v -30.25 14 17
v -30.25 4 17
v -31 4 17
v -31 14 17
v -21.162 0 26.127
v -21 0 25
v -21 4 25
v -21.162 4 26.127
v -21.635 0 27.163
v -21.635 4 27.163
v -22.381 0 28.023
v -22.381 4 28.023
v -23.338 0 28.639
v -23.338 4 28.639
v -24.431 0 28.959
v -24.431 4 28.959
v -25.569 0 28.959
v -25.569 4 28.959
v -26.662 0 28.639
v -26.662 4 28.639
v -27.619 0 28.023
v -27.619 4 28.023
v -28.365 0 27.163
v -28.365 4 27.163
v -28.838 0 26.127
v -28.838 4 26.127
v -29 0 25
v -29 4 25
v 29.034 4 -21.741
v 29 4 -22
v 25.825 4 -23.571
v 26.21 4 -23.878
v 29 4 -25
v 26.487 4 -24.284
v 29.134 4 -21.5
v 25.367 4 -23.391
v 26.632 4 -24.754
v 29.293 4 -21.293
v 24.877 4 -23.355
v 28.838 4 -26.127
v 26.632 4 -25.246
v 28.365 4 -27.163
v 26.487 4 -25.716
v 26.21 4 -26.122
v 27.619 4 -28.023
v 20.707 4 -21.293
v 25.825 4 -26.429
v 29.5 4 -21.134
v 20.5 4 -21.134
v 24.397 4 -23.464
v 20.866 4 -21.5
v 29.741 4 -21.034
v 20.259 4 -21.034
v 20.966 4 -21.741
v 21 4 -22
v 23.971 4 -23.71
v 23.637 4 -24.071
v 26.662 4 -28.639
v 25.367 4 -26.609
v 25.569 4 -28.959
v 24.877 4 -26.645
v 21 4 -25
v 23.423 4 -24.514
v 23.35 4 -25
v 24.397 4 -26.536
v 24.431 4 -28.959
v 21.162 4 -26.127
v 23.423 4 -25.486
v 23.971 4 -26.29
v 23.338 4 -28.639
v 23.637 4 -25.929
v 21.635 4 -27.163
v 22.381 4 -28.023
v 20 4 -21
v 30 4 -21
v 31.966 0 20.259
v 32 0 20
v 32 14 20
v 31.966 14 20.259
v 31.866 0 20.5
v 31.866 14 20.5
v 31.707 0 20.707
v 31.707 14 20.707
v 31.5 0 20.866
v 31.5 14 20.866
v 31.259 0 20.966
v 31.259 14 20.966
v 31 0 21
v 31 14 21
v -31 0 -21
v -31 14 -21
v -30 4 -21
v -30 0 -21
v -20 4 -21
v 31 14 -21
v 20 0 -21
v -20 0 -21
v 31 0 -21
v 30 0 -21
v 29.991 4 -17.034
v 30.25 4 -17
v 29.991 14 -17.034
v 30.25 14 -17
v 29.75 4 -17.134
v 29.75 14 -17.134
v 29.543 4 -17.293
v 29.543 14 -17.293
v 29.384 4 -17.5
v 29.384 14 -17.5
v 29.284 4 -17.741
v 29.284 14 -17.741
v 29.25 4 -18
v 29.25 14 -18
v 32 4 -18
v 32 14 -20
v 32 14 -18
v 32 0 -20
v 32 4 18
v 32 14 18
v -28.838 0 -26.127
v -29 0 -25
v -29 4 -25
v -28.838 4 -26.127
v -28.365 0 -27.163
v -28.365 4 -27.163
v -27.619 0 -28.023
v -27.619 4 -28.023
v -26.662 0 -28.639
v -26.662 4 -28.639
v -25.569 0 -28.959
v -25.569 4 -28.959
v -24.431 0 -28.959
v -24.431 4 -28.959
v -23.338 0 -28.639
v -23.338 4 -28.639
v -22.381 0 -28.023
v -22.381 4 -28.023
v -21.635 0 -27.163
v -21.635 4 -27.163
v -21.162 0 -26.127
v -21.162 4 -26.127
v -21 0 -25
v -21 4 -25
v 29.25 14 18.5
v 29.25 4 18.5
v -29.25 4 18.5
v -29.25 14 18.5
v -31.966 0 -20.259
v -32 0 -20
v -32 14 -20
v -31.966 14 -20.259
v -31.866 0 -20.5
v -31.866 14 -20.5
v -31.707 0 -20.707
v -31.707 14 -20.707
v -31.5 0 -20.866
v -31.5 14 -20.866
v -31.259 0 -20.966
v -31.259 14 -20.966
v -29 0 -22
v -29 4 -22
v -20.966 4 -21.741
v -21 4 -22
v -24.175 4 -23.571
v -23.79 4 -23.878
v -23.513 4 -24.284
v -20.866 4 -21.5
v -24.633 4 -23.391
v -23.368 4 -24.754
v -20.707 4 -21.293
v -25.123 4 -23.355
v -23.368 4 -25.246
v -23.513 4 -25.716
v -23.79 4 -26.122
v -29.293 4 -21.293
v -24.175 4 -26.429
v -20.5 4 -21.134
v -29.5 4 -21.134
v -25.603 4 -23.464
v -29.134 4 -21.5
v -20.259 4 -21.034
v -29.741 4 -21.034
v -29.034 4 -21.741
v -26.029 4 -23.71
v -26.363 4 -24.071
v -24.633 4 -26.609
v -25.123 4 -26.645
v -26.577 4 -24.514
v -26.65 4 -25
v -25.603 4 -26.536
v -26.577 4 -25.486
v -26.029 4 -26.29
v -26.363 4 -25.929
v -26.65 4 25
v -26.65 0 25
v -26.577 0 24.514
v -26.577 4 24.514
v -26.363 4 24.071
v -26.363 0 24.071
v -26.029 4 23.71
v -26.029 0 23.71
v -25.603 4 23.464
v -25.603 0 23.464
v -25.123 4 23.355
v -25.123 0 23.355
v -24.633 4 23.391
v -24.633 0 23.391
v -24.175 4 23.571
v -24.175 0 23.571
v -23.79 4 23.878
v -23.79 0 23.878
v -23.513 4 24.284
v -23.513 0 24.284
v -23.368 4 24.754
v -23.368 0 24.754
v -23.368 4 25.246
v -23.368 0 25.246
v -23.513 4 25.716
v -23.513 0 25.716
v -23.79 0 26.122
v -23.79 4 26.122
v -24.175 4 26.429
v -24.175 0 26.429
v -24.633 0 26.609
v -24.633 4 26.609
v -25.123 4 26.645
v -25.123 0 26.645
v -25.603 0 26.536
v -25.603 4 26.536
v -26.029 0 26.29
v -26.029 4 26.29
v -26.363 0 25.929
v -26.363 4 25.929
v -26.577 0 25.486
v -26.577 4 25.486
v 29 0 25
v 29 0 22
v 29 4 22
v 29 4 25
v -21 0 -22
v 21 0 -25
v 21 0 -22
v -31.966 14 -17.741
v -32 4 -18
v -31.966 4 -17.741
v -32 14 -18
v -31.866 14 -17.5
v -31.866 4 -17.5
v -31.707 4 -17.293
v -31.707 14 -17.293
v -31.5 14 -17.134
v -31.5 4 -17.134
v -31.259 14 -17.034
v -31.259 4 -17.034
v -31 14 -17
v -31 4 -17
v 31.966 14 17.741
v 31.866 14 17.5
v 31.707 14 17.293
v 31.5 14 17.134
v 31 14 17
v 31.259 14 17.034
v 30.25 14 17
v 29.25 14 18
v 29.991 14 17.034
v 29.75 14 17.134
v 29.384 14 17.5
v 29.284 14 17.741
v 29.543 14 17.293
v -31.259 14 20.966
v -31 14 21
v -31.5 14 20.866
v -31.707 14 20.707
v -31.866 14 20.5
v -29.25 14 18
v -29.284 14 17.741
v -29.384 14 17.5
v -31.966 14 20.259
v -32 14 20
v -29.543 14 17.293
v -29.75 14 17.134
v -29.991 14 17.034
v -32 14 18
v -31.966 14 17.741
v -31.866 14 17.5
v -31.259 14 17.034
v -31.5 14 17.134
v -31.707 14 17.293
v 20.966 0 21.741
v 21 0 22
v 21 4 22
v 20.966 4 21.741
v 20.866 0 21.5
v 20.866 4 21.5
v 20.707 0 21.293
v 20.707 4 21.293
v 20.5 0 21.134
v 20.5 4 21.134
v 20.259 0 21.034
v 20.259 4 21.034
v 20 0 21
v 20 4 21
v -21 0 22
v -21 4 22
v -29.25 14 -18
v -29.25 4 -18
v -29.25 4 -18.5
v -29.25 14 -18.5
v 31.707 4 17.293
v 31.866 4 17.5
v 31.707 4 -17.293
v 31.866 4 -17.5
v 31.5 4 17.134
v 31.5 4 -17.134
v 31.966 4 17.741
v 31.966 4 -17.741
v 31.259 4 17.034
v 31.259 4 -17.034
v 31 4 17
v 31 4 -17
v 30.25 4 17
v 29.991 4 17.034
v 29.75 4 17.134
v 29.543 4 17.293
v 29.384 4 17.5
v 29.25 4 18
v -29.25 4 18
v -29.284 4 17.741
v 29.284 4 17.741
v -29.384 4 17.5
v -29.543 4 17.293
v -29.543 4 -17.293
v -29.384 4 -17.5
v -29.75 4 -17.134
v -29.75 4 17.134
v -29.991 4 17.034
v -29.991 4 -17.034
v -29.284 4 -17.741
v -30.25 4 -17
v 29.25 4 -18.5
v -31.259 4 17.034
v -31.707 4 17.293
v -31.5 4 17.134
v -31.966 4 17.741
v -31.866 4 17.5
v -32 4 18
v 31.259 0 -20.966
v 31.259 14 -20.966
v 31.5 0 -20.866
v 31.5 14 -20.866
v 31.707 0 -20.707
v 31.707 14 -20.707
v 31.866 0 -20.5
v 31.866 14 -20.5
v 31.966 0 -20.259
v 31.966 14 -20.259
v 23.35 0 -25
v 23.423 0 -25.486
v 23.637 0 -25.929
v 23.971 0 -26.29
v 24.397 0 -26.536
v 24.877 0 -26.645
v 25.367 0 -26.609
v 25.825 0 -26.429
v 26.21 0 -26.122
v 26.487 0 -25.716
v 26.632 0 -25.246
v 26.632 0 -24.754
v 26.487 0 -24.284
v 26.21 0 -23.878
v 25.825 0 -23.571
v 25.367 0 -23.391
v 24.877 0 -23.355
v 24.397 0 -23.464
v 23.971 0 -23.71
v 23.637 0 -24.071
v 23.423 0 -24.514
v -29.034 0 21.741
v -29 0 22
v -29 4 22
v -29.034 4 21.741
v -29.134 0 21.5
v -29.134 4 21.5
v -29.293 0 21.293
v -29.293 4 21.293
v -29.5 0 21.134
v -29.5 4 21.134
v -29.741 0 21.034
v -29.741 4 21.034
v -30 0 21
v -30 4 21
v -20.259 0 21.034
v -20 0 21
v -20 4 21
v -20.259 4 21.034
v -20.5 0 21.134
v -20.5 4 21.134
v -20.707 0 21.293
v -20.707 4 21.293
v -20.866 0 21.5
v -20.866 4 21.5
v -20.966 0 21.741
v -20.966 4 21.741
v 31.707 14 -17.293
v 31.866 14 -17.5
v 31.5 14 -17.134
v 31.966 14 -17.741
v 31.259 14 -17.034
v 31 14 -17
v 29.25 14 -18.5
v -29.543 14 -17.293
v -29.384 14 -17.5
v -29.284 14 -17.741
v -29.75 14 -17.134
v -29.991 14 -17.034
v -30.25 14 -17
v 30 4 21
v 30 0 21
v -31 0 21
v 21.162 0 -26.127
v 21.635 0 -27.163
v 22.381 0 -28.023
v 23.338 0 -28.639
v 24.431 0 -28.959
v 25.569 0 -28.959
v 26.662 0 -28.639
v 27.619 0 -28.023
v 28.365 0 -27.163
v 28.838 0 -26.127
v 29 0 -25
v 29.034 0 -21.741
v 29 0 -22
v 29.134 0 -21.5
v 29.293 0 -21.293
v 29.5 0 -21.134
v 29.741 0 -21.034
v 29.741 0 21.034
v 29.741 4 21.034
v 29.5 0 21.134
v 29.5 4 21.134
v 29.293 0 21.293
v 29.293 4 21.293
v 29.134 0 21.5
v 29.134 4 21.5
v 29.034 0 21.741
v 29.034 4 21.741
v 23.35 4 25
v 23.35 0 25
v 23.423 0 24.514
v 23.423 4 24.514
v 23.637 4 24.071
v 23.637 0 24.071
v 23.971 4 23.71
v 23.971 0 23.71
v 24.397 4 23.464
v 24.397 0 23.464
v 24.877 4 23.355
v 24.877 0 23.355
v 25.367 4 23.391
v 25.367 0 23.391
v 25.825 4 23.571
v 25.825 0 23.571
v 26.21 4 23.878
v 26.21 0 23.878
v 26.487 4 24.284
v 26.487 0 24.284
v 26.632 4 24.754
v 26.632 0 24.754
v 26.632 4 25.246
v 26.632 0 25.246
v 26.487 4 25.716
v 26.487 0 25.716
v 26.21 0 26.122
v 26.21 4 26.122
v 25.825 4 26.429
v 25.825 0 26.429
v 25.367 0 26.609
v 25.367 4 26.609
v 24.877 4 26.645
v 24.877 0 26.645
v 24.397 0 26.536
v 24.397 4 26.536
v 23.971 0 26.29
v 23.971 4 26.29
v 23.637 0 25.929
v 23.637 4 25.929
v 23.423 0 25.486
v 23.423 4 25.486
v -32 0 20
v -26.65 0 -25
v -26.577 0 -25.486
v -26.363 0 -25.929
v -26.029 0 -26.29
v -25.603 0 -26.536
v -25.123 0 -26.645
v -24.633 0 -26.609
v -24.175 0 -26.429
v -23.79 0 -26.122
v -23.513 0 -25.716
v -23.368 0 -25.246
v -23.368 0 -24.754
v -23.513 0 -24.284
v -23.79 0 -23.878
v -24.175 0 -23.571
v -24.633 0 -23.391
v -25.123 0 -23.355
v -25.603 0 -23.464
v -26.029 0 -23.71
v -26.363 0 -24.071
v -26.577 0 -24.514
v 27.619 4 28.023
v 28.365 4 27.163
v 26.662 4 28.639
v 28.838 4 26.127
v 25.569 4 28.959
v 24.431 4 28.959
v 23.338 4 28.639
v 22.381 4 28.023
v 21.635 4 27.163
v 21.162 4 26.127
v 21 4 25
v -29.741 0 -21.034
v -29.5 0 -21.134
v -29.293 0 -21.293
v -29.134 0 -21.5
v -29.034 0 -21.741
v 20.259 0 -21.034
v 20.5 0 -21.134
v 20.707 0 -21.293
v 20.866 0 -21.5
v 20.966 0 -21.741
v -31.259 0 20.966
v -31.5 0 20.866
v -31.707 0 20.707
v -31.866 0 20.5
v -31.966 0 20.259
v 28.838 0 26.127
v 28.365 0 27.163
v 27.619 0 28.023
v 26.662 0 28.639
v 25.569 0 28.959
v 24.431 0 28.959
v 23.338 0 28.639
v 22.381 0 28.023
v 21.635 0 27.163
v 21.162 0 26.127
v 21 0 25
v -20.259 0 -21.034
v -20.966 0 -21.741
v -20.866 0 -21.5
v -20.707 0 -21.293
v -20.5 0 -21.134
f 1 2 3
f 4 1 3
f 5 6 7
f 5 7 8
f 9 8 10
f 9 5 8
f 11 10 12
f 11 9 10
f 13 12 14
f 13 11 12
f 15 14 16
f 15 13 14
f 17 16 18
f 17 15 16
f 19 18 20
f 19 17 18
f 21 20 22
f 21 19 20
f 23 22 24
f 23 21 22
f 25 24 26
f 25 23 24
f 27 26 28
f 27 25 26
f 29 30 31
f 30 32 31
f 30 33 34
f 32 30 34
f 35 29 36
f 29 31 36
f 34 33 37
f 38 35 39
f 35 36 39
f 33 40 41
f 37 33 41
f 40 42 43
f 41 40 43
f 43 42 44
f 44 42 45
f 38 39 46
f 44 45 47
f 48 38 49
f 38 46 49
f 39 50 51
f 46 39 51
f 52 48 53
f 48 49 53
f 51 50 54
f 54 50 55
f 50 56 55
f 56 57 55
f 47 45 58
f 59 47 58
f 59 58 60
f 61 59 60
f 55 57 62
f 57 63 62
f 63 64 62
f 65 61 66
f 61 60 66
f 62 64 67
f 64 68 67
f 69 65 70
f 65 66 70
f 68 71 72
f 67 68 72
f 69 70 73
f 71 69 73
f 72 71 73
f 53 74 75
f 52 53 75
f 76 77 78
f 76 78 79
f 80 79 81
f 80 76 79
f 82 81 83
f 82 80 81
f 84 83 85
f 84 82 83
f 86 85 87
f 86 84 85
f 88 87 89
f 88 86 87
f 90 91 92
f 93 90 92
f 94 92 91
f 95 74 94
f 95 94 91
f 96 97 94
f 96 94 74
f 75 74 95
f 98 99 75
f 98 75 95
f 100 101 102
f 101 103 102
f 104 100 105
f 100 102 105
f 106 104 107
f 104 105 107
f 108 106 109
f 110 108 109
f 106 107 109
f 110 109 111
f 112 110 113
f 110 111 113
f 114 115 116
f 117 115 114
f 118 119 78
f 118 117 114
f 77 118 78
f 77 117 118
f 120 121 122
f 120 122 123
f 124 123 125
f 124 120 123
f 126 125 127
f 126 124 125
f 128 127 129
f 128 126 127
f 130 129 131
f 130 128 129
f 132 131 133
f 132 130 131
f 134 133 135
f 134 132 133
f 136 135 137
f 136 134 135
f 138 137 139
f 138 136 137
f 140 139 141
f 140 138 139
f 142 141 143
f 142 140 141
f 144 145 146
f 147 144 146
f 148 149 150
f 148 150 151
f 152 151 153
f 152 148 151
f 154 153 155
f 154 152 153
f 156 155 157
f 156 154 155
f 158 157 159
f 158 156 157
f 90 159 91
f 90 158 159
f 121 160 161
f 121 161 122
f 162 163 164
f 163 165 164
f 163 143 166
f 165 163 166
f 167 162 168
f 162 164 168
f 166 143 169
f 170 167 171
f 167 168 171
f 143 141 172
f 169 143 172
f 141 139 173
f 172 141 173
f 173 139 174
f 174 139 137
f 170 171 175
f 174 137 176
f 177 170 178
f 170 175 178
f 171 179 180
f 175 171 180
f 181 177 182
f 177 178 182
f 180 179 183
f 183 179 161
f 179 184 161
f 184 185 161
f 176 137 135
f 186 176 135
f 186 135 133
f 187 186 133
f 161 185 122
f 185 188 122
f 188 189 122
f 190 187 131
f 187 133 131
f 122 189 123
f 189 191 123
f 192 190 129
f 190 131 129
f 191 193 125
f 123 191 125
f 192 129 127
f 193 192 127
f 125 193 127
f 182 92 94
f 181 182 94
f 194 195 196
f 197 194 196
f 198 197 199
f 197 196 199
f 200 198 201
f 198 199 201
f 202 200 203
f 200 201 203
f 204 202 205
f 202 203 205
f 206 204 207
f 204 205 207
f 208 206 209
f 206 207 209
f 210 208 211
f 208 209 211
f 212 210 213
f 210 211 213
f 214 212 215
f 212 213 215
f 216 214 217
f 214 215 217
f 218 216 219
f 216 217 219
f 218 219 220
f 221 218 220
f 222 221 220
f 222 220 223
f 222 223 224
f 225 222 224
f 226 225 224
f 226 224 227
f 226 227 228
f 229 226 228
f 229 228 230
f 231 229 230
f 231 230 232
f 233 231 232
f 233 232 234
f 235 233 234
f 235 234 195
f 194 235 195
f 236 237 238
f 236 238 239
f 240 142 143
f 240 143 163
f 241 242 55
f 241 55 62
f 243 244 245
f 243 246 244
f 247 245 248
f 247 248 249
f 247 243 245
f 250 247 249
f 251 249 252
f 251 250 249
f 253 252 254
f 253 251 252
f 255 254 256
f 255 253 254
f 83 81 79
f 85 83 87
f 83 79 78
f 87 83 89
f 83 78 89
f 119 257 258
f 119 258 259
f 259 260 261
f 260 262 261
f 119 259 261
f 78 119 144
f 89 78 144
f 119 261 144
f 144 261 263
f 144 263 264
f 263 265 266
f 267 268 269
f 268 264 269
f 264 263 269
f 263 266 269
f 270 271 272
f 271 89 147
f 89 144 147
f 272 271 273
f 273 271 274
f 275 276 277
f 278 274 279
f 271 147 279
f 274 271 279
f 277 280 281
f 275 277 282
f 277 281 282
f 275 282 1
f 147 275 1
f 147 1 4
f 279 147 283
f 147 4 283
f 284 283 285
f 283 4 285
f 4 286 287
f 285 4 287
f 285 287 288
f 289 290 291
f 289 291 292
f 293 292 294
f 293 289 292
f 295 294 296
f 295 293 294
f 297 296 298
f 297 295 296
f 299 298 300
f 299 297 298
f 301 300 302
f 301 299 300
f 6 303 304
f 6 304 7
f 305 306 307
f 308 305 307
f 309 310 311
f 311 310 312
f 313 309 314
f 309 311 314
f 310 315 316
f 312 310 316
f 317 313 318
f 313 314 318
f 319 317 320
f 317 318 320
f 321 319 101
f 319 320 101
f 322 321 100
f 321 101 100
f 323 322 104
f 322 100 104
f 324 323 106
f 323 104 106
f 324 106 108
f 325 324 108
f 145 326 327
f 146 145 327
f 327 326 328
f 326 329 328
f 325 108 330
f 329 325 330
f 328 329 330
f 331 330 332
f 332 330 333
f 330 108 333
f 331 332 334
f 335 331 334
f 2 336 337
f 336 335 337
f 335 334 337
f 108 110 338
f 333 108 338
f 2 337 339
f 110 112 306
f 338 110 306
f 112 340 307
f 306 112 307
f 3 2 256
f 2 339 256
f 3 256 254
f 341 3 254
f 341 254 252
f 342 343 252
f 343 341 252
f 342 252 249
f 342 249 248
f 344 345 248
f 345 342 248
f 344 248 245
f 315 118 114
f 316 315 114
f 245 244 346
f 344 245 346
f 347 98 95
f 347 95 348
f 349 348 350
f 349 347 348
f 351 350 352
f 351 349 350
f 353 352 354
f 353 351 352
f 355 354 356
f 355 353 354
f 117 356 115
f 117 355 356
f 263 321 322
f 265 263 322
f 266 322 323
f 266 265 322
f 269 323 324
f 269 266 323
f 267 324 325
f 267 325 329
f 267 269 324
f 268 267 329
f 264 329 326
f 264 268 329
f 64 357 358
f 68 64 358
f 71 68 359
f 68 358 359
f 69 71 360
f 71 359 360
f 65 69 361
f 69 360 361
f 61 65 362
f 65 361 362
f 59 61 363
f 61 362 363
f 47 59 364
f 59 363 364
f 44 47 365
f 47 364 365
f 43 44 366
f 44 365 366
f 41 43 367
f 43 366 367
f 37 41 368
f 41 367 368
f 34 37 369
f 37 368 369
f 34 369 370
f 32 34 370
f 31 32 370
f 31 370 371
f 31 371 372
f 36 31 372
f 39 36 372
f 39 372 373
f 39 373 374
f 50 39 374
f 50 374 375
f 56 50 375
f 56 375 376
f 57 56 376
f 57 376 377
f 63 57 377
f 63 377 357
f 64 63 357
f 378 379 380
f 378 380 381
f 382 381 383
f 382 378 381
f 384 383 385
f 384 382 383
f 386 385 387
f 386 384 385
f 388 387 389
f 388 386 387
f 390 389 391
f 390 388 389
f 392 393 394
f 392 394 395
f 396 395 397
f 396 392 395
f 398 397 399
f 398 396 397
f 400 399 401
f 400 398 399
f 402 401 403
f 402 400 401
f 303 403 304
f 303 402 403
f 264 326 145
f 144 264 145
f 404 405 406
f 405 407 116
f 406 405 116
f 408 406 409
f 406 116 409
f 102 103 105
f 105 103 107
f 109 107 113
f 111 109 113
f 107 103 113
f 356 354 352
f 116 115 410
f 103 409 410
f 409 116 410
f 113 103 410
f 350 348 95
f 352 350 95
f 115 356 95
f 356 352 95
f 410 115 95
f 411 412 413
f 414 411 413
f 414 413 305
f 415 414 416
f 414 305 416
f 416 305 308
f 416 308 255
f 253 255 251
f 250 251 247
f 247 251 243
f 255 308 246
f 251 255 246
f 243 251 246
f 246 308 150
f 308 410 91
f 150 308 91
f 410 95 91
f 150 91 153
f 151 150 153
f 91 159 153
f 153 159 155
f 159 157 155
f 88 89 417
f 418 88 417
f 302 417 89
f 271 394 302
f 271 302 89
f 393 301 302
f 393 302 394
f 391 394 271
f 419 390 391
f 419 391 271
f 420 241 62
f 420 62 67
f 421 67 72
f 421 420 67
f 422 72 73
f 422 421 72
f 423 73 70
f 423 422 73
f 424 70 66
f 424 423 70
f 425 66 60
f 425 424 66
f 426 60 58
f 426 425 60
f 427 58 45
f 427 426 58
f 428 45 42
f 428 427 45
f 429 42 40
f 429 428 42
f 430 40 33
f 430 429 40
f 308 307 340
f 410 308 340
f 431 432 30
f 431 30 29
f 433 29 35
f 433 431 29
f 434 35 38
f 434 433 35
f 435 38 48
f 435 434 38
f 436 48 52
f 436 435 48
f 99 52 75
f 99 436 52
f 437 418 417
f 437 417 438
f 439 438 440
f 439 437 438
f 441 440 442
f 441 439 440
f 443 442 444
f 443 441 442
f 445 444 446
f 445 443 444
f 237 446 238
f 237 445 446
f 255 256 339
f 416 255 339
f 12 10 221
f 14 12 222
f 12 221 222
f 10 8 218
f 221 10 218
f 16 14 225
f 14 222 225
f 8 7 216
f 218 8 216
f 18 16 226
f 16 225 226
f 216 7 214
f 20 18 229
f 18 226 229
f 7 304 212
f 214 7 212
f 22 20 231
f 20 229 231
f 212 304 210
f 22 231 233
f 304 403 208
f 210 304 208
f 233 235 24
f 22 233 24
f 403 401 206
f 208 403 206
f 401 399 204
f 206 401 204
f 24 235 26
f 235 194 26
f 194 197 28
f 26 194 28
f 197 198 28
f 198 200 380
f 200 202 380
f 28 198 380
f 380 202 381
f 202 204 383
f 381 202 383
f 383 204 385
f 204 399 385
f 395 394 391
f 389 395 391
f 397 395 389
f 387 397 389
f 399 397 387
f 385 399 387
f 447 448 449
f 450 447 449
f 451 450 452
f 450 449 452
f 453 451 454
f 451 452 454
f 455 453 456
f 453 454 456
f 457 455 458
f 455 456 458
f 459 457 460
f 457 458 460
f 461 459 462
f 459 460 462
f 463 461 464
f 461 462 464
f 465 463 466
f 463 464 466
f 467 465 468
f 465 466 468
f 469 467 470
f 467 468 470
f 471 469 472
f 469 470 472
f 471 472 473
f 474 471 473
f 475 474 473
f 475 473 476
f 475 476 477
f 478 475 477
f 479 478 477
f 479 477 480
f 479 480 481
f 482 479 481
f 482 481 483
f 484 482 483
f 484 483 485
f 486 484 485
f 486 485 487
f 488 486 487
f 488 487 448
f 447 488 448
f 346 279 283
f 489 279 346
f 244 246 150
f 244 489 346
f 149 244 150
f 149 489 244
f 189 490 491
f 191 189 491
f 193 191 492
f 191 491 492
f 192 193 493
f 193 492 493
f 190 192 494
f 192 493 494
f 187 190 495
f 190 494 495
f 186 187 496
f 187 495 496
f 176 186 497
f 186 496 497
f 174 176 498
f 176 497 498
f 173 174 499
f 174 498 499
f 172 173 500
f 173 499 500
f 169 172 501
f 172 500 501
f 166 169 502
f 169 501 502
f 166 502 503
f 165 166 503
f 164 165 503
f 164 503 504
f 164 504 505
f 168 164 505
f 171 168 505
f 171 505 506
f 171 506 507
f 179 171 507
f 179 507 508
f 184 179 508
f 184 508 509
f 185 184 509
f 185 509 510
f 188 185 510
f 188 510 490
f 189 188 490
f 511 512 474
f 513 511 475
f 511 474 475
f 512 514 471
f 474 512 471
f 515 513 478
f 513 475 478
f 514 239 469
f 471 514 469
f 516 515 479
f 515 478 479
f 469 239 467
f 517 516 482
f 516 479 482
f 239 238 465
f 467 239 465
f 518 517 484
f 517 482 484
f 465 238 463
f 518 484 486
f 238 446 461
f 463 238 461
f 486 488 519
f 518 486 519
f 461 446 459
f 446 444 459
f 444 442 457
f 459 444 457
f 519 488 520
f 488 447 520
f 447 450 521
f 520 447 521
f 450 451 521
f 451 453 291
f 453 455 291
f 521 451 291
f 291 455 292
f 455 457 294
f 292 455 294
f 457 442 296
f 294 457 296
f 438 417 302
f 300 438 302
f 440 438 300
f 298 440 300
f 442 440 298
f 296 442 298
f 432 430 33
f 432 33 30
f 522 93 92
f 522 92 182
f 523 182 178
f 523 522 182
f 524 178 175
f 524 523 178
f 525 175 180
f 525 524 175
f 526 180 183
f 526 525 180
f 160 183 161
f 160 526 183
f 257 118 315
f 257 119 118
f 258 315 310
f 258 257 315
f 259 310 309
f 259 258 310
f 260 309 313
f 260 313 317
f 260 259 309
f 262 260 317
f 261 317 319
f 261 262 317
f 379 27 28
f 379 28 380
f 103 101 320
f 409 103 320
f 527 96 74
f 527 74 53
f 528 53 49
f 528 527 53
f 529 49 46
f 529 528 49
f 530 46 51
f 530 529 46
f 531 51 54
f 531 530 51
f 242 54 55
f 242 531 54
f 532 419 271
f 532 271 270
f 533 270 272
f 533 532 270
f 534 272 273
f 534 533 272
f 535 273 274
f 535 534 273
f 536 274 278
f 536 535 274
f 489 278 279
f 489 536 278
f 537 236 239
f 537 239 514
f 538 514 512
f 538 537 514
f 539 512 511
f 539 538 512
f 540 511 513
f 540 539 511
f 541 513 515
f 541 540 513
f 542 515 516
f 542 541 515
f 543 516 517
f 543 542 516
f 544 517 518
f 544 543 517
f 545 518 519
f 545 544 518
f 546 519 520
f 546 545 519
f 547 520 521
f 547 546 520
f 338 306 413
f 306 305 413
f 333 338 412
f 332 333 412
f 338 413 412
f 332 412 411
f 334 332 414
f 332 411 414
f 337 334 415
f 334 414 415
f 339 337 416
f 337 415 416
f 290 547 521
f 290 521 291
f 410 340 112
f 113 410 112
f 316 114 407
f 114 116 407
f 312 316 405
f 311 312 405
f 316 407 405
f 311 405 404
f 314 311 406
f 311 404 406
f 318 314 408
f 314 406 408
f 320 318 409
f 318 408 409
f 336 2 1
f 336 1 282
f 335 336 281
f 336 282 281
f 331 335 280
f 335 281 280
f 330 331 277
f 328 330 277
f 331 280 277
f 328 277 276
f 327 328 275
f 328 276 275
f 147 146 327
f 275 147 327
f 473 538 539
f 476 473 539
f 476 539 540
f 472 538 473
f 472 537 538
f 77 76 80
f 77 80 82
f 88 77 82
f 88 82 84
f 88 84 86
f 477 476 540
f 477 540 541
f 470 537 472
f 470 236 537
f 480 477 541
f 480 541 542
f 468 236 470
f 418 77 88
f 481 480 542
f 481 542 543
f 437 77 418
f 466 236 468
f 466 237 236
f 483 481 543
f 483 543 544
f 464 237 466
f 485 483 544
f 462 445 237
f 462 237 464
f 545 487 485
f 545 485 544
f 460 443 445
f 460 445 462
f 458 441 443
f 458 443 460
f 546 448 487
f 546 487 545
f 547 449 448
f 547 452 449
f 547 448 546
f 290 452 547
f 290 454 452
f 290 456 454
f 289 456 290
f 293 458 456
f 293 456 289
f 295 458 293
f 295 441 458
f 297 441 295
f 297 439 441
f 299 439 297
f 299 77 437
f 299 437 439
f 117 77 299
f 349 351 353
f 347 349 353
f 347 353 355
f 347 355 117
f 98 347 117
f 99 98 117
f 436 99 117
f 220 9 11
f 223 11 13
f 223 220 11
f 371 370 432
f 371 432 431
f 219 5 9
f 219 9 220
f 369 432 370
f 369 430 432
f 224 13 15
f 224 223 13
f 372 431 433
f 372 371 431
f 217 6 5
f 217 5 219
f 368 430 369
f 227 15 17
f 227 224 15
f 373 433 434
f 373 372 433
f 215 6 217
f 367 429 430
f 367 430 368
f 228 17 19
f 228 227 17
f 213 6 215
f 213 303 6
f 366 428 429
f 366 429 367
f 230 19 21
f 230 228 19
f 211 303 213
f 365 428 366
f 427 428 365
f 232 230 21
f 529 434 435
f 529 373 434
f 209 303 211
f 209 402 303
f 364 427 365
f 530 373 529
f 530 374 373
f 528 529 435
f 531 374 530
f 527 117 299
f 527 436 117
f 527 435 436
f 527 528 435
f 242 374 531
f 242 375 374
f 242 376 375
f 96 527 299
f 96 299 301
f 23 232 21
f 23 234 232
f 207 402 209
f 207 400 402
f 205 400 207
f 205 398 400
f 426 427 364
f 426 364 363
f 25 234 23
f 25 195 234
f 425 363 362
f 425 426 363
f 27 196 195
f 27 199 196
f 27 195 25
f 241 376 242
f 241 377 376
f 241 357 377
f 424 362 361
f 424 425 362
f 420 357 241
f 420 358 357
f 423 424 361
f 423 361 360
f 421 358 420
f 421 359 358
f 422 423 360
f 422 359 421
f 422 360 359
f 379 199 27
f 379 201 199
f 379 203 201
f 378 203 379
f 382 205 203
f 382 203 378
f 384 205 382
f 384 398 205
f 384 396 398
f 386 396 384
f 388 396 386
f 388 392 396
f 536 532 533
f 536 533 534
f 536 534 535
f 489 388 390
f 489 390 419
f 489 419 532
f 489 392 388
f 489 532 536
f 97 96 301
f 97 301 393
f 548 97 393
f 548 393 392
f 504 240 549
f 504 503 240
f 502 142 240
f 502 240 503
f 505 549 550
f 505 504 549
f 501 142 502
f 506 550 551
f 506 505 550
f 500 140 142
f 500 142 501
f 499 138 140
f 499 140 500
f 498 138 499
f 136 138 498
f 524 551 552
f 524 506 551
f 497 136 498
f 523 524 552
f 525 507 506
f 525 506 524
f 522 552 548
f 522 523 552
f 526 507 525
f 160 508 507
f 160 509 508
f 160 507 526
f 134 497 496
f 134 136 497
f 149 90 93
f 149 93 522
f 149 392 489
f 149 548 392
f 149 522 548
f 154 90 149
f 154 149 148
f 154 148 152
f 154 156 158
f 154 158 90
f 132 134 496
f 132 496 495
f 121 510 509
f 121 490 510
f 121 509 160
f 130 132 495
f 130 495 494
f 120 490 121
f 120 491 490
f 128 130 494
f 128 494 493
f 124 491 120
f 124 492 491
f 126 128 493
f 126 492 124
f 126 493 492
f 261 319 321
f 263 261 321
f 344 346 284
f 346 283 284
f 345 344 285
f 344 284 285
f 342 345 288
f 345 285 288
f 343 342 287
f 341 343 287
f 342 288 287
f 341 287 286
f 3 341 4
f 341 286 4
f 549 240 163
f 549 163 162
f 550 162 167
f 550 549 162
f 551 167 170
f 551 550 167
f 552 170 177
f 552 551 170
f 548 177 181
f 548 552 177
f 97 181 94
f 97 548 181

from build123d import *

# Parameters (mm, degrees)
BOSS_EXTRUDE1_DEPTH   = 14
CUT_EXTRUDE1_START    = -10
CUT_EXTRUDE1_DEPTH    = 10
M4X0_7_TAPPED_HOLE1_D = 3.3
FILLET2_R             = 1


with BuildPart() as part:
    # Sketch1 → Boss-Extrude1 (new body)
    with BuildSketch(Plane(origin=(0, 0, 0), x_dir=(1, 0, 0), z_dir=(0, 1, 0))):
        with BuildLine():
            Line((-31, 21), (-30, 21))
            ThreePointArc((-30, 21), (-29.292893219, 21.292893219), (-29, 22))
            Line((-29, 22), (-29, 25))
            ThreePointArc((-29, 25), (-25, 29), (-21, 25))
            Line((-21, 25), (-21, 22))
            ThreePointArc((-21, 22), (-20.707106781, 21.292893219), (-20, 21))
            Line((-20, 21), (20, 21))
            ThreePointArc((20, 21), (20.707106781, 21.292893219), (21, 22))
            Line((21, 22), (21, 25))
            ThreePointArc((21, 25), (25, 29), (29, 25))
            Line((29, 25), (29, 22))
            ThreePointArc((29, 22), (29.292893219, 21.292893219), (30, 21))
            Line((30, 21), (31, 21))
            ThreePointArc((31, 21), (31.707106781, 20.707106781), (32, 20))
            Line((32, 20), (32, -20))
            ThreePointArc((32, -20), (31.707106781, -20.707106781), (31, -21))
            Line((31, -21), (30, -21))
            ThreePointArc((30, -21), (29.292893219, -21.292893219), (29, -22))
            Line((29, -22), (29, -25))
            ThreePointArc((29, -25), (25, -29), (21, -25))
            Line((21, -25), (21, -22))
            ThreePointArc((21, -22), (20.707106781, -21.292893219), (20, -21))
            Line((20, -21), (-20, -21))
            ThreePointArc((-20, -21), (-20.707106781, -21.292893219), (-21, -22))
            Line((-21, -22), (-21, -25))
            ThreePointArc((-21, -25), (-25, -29), (-29, -25))
            Line((-29, -25), (-29, -22))
            ThreePointArc((-29, -22), (-29.292893219, -21.292893219), (-30, -21))
            Line((-30, -21), (-31, -21))
            ThreePointArc((-31, -21), (-31.707106781, -20.707106781), (-32, -20))
            Line((-32, -20), (-32, 20))
            ThreePointArc((-32, 20), (-31.707106781, 20.707106781), (-31, 21))
        make_face()
    extrude(amount=BOSS_EXTRUDE1_DEPTH)

    # Sketch2 → Cut-Extrude1 (cut)
    with BuildSketch(Plane(origin=(0, 14, 0), x_dir=(1, 0, 0), z_dir=(0, 1, 0)).offset(CUT_EXTRUDE1_START)):
        with BuildLine():
            Line((-30, -21), (-20, -21))
            ThreePointArc((-20, -21), (-20.707106781, -21.292893219), (-21, -22))
            Line((-21, -22), (-21, -25))
            ThreePointArc((-21, -25), (-25, -29), (-29, -25))
            Line((-29, -25), (-29, -22))
            ThreePointArc((-29, -22), (-29.292893219, -21.292893219), (-30, -21))
        make_face()
        Polygon((-29.25, 18.5), (29.25, 18.5), (29.25, 17), (32, 17), (32, -17), (29.25, -17), (29.25, -18.5), (-29.25, -18.5), (-29.25, -17), (-32, -17), (-32, 17), (-29.25, 17), align=None)
        with BuildLine():
            Line((21, -25), (21, -22))
            ThreePointArc((21, -22), (20.707106781, -21.292893219), (20, -21))
            Line((20, -21), (30, -21))
            ThreePointArc((30, -21), (29.292893219, -21.292893219), (29, -22))
            Line((29, -22), (29, -25))
            ThreePointArc((29, -25), (25, -29), (21, -25))
        make_face()
        with BuildLine():
            Line((30, 21), (20, 21))
            ThreePointArc((20, 21), (20.707106781, 21.292893219), (21, 22))
            Line((21, 22), (21, 25))
            ThreePointArc((21, 25), (25, 29), (29, 25))
            Line((29, 25), (29, 22))
            ThreePointArc((29, 22), (29.292893219, 21.292893219), (30, 21))
        make_face()
        with BuildLine():
            Line((-21, 25), (-21, 22))
            ThreePointArc((-21, 22), (-20.707106781, 21.292893219), (-20, 21))
            Line((-20, 21), (-30, 21))
            ThreePointArc((-30, 21), (-29.292893219, 21.292893219), (-29, 22))
            Line((-29, 22), (-29, 25))
            ThreePointArc((-29, 25), (-25, 29), (-21, 25))
        make_face()
    extrude(amount=CUT_EXTRUDE1_DEPTH, mode=Mode.SUBTRACT)

    # M4x0.7 Tapped Hole1 (through all)
    with Locations(Plane(origin=(0, 4, 0), x_dir=(1, 0, 0), z_dir=(0, 1, 0))):
        with Locations((-25, 25), (25, 25), (25, -25), (-25, -25)):
            Hole(M4X0_7_TAPPED_HOLE1_D / 2)

    # Fillet2
    fillet2_edges = [part.edges().sort_by_distance(p)[0] for p in [
        (-29.25, 9, -17),
        (29.25, 9, -17),
        (32, 9, -17),
        (32, 9, 17),
        (29.25, 9, 17),
        (-29.25, 9, 17),
        (-32, 9, 17),
        (-32, 9, -17),
    ]]
    fillet(fillet2_edges, radius=FILLET2_R)


solid = part.part
